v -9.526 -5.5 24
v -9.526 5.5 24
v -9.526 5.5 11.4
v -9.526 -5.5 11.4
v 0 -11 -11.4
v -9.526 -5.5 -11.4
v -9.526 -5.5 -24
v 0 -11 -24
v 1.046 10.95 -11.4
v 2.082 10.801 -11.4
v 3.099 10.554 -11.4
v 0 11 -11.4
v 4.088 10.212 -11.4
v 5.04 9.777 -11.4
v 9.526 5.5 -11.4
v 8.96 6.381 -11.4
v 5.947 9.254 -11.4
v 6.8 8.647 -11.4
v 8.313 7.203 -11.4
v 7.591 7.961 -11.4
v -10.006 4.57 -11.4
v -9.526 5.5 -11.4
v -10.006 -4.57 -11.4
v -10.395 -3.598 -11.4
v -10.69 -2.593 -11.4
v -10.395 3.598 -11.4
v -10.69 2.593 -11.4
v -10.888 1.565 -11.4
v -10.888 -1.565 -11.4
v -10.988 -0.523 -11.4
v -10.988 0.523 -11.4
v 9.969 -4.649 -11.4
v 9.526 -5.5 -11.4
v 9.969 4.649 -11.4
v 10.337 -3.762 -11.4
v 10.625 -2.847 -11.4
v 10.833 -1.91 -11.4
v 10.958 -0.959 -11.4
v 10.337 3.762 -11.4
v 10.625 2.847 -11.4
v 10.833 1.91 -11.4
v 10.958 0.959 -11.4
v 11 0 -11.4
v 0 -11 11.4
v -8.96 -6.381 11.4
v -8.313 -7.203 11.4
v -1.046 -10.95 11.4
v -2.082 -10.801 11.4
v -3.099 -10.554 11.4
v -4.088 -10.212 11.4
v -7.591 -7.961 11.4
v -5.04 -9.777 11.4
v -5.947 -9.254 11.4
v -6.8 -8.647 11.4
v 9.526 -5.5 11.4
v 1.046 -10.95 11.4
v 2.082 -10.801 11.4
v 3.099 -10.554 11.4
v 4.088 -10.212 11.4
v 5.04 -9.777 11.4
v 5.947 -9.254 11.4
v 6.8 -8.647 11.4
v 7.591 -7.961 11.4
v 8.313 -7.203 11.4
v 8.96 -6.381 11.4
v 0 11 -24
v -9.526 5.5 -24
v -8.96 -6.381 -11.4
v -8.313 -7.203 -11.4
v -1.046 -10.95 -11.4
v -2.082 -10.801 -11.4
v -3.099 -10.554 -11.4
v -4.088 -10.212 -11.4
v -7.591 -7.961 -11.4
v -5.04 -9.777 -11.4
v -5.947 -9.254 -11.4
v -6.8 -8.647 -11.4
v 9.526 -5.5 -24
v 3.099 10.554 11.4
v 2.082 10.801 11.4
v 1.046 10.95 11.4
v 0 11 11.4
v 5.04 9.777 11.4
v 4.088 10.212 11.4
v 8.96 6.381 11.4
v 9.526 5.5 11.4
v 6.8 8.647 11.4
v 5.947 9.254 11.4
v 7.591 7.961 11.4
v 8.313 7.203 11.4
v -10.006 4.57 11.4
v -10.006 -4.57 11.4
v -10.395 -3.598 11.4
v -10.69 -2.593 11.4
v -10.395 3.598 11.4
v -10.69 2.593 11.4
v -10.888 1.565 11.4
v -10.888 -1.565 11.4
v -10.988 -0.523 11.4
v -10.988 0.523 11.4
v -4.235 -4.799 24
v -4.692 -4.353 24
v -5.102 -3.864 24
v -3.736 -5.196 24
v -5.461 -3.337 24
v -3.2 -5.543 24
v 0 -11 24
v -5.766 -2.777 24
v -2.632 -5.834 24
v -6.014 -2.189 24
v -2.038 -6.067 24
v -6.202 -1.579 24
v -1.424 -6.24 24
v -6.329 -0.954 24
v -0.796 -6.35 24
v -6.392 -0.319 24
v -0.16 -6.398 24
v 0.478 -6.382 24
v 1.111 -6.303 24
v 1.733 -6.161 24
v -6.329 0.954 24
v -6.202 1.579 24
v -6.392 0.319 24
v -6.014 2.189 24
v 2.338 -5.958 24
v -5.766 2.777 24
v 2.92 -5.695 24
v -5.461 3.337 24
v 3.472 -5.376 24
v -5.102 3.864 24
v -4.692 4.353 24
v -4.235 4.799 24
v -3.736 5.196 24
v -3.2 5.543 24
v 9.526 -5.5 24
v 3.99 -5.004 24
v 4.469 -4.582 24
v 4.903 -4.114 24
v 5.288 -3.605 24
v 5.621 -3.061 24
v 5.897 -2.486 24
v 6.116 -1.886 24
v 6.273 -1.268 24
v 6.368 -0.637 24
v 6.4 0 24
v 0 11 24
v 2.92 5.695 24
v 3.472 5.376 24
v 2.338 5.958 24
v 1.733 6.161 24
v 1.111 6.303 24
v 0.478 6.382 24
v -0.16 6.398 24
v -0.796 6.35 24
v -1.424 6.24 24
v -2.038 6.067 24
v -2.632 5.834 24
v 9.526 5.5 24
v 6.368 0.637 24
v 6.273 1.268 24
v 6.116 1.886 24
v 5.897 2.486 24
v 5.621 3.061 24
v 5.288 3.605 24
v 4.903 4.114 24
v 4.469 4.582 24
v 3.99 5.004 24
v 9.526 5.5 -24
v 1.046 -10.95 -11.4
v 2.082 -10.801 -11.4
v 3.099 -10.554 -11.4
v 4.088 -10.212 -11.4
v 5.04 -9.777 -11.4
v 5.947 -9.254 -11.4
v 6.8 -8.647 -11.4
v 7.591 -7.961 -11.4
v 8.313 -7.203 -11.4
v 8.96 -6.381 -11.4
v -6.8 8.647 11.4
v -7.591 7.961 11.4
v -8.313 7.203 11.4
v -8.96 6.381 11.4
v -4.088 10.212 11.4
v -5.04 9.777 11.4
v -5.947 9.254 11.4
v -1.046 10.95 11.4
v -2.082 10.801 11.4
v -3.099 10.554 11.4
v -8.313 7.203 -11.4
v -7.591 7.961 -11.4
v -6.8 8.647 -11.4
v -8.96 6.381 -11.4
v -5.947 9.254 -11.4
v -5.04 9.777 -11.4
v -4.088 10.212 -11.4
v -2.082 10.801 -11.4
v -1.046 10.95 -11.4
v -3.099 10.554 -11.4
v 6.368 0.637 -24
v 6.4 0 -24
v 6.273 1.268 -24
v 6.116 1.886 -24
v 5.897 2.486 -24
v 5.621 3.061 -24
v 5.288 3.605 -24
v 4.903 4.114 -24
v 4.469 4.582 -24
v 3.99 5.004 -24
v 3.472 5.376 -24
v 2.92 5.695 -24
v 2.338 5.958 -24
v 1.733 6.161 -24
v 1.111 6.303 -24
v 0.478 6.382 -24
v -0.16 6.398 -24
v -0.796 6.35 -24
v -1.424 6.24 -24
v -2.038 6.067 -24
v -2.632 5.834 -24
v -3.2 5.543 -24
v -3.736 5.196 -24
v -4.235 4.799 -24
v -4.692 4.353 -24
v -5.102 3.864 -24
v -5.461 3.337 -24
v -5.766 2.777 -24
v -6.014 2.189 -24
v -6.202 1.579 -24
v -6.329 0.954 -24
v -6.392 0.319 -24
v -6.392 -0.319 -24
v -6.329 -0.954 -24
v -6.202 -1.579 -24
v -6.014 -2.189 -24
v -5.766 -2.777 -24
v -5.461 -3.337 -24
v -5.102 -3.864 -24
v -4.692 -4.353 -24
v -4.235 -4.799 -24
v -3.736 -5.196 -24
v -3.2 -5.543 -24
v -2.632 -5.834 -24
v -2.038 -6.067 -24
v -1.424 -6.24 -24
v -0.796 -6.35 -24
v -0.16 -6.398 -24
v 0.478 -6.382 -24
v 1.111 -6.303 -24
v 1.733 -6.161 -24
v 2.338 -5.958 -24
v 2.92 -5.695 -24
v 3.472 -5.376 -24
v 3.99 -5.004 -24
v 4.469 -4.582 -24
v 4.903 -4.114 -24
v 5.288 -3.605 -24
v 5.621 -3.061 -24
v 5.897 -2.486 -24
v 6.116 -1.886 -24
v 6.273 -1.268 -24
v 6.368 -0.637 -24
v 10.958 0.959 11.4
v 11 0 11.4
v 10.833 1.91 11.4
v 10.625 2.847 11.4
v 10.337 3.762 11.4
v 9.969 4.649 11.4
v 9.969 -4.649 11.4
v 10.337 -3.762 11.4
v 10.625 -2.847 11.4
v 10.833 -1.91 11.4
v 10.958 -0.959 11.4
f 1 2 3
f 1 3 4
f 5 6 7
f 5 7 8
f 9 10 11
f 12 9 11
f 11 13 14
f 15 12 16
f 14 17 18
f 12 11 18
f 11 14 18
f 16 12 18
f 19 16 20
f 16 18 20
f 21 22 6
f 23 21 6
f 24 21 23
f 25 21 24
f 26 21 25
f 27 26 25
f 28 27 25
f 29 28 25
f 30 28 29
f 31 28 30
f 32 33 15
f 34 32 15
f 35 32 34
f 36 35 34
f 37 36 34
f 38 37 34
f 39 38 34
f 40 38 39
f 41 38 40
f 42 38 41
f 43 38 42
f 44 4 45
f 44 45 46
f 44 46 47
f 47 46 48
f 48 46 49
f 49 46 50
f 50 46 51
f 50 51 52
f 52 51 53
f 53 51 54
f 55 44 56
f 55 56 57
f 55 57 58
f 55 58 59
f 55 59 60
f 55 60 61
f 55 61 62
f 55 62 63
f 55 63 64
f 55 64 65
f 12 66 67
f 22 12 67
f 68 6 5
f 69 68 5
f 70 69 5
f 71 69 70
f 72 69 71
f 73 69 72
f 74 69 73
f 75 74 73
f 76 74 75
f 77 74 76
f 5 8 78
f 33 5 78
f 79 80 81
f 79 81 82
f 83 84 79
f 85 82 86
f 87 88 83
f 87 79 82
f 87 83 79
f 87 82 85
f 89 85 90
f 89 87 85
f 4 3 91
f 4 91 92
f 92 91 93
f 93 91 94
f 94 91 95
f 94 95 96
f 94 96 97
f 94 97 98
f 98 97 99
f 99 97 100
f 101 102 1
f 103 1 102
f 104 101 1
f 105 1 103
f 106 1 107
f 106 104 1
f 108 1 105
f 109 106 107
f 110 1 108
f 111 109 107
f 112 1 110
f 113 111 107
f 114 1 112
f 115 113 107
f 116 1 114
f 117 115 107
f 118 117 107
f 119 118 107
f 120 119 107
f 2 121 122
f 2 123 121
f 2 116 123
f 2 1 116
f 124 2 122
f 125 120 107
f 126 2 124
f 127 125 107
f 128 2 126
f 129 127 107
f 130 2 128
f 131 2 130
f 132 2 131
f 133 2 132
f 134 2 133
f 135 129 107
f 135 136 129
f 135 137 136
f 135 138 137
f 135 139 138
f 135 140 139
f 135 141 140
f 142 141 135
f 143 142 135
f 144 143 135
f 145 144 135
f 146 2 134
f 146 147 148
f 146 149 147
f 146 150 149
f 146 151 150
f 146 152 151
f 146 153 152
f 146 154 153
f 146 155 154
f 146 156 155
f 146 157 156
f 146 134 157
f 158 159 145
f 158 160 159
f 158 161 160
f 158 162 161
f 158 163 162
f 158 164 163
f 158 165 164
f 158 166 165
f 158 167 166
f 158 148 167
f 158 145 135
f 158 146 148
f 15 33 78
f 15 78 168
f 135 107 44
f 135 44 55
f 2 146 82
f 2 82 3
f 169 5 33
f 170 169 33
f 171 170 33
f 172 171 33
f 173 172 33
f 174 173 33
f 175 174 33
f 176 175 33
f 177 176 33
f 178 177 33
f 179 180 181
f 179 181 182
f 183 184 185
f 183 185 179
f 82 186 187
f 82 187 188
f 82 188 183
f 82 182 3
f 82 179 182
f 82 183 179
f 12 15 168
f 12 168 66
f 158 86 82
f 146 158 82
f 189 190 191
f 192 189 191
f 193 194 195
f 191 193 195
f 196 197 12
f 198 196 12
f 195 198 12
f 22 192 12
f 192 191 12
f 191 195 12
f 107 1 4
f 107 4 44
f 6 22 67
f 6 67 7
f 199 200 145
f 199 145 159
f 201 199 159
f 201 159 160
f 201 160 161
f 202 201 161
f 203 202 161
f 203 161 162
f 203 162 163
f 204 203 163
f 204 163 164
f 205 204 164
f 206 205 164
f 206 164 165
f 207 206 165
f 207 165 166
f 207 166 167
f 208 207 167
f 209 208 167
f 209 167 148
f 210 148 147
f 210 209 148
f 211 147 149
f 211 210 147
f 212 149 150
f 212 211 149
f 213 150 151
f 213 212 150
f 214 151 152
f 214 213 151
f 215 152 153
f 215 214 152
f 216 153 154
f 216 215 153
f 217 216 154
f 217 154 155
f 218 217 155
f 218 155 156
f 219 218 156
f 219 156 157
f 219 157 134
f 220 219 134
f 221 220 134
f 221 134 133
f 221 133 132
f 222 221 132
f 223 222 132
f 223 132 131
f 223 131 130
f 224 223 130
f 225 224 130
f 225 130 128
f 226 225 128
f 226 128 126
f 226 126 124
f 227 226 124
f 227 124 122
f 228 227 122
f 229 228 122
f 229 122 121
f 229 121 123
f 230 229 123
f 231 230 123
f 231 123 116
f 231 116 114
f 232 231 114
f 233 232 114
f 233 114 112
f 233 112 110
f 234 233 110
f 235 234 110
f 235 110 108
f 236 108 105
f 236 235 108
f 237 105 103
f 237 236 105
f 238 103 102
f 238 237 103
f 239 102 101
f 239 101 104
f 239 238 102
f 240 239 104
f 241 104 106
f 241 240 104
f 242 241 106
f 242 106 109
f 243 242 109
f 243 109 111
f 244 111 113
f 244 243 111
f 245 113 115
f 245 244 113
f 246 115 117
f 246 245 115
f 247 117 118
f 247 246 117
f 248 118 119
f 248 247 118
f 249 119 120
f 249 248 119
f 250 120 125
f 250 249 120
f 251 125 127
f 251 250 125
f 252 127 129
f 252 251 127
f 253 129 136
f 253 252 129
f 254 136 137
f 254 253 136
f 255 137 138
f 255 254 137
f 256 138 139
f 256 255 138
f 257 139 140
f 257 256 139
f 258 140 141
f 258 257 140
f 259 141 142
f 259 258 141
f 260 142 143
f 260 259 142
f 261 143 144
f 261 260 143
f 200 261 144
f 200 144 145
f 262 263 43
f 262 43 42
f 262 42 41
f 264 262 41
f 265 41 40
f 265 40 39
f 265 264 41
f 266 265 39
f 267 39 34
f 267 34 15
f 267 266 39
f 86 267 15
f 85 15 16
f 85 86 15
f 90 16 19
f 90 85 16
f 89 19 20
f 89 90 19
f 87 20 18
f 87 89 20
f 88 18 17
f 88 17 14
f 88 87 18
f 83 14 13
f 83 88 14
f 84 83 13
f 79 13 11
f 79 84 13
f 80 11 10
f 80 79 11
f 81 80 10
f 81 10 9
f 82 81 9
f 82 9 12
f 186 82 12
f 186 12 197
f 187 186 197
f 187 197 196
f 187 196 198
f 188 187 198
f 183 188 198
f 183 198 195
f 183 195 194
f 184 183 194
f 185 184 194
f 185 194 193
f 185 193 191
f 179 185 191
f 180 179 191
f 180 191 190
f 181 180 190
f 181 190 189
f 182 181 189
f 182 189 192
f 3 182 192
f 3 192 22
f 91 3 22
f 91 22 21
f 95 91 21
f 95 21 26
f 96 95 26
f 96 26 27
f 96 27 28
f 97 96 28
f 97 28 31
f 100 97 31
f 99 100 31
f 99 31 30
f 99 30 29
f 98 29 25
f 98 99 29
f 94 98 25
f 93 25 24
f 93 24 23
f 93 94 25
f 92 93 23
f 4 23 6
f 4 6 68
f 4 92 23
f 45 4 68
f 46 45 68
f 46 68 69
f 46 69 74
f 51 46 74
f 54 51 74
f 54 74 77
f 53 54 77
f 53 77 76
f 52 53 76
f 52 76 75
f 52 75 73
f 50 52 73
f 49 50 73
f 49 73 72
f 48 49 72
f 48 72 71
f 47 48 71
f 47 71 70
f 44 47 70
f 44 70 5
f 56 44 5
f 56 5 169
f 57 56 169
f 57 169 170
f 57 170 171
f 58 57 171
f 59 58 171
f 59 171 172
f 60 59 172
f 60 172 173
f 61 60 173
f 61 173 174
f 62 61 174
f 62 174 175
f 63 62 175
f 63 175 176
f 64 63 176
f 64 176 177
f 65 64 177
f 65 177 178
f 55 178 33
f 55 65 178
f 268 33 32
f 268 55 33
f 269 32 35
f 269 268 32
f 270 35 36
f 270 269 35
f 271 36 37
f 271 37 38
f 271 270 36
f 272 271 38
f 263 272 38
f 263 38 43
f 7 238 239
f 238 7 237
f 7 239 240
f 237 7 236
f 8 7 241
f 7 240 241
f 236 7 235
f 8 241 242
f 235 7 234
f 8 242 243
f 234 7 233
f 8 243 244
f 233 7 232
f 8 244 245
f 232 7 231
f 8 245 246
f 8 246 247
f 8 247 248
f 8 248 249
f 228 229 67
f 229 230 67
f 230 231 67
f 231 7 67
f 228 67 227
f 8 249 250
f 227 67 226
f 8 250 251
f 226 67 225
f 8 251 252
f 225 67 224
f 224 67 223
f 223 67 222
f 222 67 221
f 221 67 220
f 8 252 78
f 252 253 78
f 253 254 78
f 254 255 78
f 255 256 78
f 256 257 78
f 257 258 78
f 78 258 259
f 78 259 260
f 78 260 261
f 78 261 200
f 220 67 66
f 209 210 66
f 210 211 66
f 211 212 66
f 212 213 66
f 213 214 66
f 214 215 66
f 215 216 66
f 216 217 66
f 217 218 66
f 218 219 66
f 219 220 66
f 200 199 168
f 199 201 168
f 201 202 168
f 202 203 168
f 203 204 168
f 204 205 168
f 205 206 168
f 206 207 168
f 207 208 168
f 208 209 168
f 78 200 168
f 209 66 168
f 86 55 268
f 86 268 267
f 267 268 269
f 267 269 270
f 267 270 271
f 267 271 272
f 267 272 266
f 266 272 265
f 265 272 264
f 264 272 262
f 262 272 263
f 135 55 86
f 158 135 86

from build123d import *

# Parameters (mm, degrees)
SKETCH1_R           = 11
SKETCH1_R_2         = 6.4
BOSS_EXTRUDE1_DEPTH = 11.4
SKETCH1_3_R         = 6.4
BOSS_EXTRUDE2_DEPTH = 24


with BuildPart() as part:
    # Sketch1 → Boss-Extrude1 (new, symmetric)
    with BuildSketch(Plane.XY):
        Circle(SKETCH1_R)
        Circle(SKETCH1_R_2, mode=Mode.SUBTRACT)
    extrude(amount=BOSS_EXTRUDE1_DEPTH, both=True)

    # Sketch1<3> → Boss-Extrude2 (add, symmetric)
    with BuildSketch(Plane.XY):
        Polygon((-9.526279442, -5.5), (0, -11), (9.526279442, -5.5), (9.526279442, 5.5), (0, 11), (-9.526279442, 5.5), align=None)
        Circle(SKETCH1_3_R, mode=Mode.SUBTRACT)
    extrude(amount=BOSS_EXTRUDE2_DEPTH, both=True)


solid = part.part
